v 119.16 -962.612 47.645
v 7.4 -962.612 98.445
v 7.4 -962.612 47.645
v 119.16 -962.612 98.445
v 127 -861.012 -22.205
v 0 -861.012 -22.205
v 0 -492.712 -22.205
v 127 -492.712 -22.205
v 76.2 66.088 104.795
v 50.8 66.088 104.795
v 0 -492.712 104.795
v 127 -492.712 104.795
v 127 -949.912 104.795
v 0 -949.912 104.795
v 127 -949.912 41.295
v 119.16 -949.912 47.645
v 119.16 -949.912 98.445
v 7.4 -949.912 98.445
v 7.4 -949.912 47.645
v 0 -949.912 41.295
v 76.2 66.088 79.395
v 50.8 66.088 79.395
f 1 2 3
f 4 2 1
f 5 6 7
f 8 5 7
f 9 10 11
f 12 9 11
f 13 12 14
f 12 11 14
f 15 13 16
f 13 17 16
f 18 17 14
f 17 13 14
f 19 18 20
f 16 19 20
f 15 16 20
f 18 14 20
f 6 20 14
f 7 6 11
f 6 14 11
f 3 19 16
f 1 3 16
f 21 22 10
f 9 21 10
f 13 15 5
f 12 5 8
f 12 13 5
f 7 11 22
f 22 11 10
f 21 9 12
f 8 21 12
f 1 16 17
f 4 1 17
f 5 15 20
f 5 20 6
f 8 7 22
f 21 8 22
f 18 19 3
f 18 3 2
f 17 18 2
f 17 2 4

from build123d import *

# Parameters (mm, degrees)
F1_DEPTH = 127
F2_W     = 111.76
F2_H     = 50.8
F3_DEPTH = 12.7
F5_DEPTH = 138.684


with BuildPart() as f1:
    # F0 (on Right) → F1 (new body)
    with BuildSketch(Plane.YZ):
        Polygon((66.087551, 104.79458), (-949.912449, 104.79458), (-949.912449, 41.29458), (-861.012449, -22.20542), (-492.712449, -22.20542), (66.087551, 79.39458), align=None)
    extrude(amount=F1_DEPTH)

    # F2 (on face) → F3 (join)
    with BuildSketch(Plane.XZ.offset(949.912449)):
        with Locations((63.28021, 73.04458)):
            Rectangle(F2_W, F2_H)
    extrude(amount=F3_DEPTH)

    # F4 (on face) → F5 (cut)
    with BuildSketch(Plane.XY.offset(104.79458)):
        Polygon((0, -492.712449), (50.8, 66.087551), (0, 66.087551), align=None)
        Polygon((127, 66.087551), (76.2, 66.087551), (127, -492.712449), align=None)
    extrude(amount=-F5_DEPTH, mode=Mode.SUBTRACT)


solid = f1.part
